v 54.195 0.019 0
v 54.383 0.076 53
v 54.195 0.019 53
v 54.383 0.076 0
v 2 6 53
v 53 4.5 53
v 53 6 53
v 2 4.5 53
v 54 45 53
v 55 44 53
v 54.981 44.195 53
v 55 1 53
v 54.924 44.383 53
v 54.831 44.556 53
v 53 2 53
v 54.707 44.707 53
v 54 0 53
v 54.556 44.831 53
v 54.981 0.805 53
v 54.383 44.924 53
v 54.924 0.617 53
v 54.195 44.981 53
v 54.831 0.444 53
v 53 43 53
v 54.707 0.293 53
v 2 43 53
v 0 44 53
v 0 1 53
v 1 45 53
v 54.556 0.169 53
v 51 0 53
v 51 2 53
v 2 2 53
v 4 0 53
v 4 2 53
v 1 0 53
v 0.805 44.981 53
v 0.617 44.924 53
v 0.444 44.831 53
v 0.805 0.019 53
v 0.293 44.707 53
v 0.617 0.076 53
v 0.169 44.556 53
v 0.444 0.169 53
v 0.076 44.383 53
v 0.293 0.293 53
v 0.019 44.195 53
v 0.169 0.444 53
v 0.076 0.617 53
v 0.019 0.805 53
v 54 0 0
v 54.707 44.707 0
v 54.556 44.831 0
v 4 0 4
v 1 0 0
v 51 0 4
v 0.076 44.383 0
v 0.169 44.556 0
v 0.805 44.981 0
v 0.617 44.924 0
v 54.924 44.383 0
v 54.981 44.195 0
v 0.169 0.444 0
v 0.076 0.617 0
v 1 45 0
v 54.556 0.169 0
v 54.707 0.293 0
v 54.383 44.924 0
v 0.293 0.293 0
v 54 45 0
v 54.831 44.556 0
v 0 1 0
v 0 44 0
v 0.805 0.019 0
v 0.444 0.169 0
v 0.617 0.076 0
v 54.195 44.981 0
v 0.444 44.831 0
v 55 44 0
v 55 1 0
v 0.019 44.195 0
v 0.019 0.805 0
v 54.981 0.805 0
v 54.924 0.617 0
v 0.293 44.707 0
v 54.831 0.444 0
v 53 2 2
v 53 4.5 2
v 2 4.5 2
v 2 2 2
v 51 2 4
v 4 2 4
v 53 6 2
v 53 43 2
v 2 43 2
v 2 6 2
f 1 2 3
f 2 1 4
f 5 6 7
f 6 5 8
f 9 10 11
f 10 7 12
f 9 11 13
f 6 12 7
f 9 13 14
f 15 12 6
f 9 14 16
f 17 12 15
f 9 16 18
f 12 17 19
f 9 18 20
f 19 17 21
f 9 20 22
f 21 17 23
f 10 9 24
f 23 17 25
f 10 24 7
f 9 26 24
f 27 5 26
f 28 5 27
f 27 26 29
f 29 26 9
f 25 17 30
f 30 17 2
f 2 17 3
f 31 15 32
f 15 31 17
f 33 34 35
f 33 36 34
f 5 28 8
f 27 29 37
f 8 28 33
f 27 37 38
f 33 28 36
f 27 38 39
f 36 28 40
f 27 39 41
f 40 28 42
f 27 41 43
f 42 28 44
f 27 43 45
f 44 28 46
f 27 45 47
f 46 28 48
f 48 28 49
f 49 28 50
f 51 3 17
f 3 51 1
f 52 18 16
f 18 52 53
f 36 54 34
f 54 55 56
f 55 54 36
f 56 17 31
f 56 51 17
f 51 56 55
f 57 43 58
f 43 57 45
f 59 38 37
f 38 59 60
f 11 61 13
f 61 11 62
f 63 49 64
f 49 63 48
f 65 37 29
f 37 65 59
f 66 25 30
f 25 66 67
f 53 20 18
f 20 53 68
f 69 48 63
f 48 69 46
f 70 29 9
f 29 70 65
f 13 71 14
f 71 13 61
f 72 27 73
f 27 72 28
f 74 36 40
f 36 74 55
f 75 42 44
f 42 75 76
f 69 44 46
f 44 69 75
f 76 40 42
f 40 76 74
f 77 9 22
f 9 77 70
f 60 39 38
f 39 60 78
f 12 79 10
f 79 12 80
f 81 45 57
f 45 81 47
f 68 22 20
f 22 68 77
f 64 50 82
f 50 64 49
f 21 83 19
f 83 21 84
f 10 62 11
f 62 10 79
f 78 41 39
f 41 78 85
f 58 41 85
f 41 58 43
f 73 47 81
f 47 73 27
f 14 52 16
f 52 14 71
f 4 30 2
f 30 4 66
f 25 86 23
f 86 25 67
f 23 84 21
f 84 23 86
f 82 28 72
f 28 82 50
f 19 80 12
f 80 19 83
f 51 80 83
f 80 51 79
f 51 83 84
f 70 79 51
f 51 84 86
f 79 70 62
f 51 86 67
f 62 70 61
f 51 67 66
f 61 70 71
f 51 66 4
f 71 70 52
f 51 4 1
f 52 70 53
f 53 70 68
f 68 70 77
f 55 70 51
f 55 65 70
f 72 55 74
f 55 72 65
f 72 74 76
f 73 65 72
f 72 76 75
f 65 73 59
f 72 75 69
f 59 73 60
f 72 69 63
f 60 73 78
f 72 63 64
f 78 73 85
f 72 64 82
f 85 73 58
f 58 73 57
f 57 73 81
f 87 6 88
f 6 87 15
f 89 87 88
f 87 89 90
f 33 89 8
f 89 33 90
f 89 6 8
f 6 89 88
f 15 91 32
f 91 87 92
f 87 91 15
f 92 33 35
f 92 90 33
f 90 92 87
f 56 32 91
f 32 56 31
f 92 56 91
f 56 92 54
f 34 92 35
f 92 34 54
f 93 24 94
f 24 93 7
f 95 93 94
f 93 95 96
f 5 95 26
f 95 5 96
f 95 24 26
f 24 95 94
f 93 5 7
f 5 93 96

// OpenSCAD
normed_xy=50;
normed_z=15;
// cube( [50,50,1]);
// cube( [50,50,15]);
// #Diamond_I();
// #Diamond_II();
// #Diamond_III();
// #Champion_I();
// #Champion_II();
// #Champion_III();




card_xy=50;
card_t=1;
card_r=2;
card_border_t=2;
card_border_w=2;
margin=1;

emblem_t=5;

box_x_plus=1;
box_z_plus=1;
box_t=2;
box_x=card_xy+box_x_plus+2*box_t;
// box_y=5*(6/*card*/);
box_y=box_t + card_border_t + box_t+box_t+ 5*(emblem_t+card_border_t) +2;
box_z=card_xy+box_z_plus+card_border_w;

card_holder=2;

// card();
// emblem();
box();


module box(){
  difference(){
    linear_extrude(height=box_z)
    offset(1, $fn=32)
    offset(-1)
    square([box_x,box_y]);

    #translate([box_t,box_t,box_t])
    cube([card_xy+box_x_plus,card_border_t+.5,card_xy+box_z_plus]);

    translate([box_t+card_holder,0,box_t+card_holder])
    cube([card_xy+box_x_plus-2*card_holder,card_border_t,card_xy+box_z_plus-card_holder]);


    translate([box_t,box_t+card_border_t+box_t,box_t])
    #cube([card_xy+box_x_plus,box_y-(box_t+box_t+card_border_t+box_t),card_xy+box_z_plus]);
  }
}

module emblem() {
  intersection(){
    cube([100,100,100]);
    translate([0,0,-6])
    translate([card_border_w+margin,card_border_w+margin,0])
    // translate([0,0,card_t])
    scale([(card_xy-2*card_border_w-2*margin)/normed_xy,(card_xy-2*card_border_w-2*margin)/normed_xy,(emblem_t+6)/normed_z ])
    
    // Diamond_I();
    // Diamond_II();
    // Diamond_III();
    // Champion_I();
    // Champion_II();
    // translate([0,0,4])
    Champion_III();
  }
}

module card(){
  difference(){
    linear_extrude(height=card_border_t)
    offset(card_r, $fn=32)
    offset(-card_r)
    square([card_xy,card_xy]);

    translate([card_border_w,card_border_w,card_border_t-card_t])
    linear_extrude(height=card_t)
    offset(card_r, $fn=32)
    offset(-card_r)
    square([card_xy-2*card_border_w,card_xy-2*card_border_w]);
  }
}


// NORMED with [50,50,15]
dia_scale_fac_xy=.765;
dia_scale_fac_z=1;
dia_x_off = -75.5;
dia_y_off=172;

module Diamond_I(){
  scale([dia_scale_fac_xy,dia_scale_fac_xy,dia_scale_fac_z])
  translate([dia_x_off,dia_y_off,0])
  rotate([90,0,0])
  import("./Diamond_I.stl");
}
module Diamond_II(){
  scale([dia_scale_fac_xy,dia_scale_fac_xy,dia_scale_fac_z])
  translate([dia_x_off,dia_y_off,0])
  rotate([90,0,0])
  import("./Diamond_II.stl");
}
module Diamond_III(){
  scale([dia_scale_fac_xy,dia_scale_fac_xy,dia_scale_fac_z])
  translate([dia_x_off,dia_y_off,0])
  rotate([90,0,0])
  import("./Diamond_III.stl");
}

module Champion_I(){
  champ_scale_fac_xy=.83;
  champ_scale_fac_z=1;
  champ_x_off = -130;
  champ_y_off=108.5;

  scale([champ_scale_fac_xy,champ_scale_fac_xy,champ_scale_fac_z])
  translate([champ_x_off,champ_y_off,0])
  rotate([90,0,0])
  import("./Champion_I.stl");
}

module Champion_II(){
  champ_scale_fac_xy=.83;
  champ_scale_fac_z=1;
  champ_x_off = -143;
  champ_y_off=94;

  scale([champ_scale_fac_xy,champ_scale_fac_xy,champ_scale_fac_z])
  translate([champ_x_off,champ_y_off,0])
  rotate([90,0,0])
  import("./Champion_II.stl");
}
module Champion_III(){
  champ_scale_fac_xy=.83;
  champ_scale_fac_z=.938;
  champ_x_off = -107.8;
  champ_y_off=138;

  scale([champ_scale_fac_xy,champ_scale_fac_xy,champ_scale_fac_z])
  translate([champ_x_off,champ_y_off,0])
  rotate([90,0,0])
  import("./Champion_III.stl");
}

// module Grand_Champion(){
  // import("./Grand_Champion.stl");
// }
